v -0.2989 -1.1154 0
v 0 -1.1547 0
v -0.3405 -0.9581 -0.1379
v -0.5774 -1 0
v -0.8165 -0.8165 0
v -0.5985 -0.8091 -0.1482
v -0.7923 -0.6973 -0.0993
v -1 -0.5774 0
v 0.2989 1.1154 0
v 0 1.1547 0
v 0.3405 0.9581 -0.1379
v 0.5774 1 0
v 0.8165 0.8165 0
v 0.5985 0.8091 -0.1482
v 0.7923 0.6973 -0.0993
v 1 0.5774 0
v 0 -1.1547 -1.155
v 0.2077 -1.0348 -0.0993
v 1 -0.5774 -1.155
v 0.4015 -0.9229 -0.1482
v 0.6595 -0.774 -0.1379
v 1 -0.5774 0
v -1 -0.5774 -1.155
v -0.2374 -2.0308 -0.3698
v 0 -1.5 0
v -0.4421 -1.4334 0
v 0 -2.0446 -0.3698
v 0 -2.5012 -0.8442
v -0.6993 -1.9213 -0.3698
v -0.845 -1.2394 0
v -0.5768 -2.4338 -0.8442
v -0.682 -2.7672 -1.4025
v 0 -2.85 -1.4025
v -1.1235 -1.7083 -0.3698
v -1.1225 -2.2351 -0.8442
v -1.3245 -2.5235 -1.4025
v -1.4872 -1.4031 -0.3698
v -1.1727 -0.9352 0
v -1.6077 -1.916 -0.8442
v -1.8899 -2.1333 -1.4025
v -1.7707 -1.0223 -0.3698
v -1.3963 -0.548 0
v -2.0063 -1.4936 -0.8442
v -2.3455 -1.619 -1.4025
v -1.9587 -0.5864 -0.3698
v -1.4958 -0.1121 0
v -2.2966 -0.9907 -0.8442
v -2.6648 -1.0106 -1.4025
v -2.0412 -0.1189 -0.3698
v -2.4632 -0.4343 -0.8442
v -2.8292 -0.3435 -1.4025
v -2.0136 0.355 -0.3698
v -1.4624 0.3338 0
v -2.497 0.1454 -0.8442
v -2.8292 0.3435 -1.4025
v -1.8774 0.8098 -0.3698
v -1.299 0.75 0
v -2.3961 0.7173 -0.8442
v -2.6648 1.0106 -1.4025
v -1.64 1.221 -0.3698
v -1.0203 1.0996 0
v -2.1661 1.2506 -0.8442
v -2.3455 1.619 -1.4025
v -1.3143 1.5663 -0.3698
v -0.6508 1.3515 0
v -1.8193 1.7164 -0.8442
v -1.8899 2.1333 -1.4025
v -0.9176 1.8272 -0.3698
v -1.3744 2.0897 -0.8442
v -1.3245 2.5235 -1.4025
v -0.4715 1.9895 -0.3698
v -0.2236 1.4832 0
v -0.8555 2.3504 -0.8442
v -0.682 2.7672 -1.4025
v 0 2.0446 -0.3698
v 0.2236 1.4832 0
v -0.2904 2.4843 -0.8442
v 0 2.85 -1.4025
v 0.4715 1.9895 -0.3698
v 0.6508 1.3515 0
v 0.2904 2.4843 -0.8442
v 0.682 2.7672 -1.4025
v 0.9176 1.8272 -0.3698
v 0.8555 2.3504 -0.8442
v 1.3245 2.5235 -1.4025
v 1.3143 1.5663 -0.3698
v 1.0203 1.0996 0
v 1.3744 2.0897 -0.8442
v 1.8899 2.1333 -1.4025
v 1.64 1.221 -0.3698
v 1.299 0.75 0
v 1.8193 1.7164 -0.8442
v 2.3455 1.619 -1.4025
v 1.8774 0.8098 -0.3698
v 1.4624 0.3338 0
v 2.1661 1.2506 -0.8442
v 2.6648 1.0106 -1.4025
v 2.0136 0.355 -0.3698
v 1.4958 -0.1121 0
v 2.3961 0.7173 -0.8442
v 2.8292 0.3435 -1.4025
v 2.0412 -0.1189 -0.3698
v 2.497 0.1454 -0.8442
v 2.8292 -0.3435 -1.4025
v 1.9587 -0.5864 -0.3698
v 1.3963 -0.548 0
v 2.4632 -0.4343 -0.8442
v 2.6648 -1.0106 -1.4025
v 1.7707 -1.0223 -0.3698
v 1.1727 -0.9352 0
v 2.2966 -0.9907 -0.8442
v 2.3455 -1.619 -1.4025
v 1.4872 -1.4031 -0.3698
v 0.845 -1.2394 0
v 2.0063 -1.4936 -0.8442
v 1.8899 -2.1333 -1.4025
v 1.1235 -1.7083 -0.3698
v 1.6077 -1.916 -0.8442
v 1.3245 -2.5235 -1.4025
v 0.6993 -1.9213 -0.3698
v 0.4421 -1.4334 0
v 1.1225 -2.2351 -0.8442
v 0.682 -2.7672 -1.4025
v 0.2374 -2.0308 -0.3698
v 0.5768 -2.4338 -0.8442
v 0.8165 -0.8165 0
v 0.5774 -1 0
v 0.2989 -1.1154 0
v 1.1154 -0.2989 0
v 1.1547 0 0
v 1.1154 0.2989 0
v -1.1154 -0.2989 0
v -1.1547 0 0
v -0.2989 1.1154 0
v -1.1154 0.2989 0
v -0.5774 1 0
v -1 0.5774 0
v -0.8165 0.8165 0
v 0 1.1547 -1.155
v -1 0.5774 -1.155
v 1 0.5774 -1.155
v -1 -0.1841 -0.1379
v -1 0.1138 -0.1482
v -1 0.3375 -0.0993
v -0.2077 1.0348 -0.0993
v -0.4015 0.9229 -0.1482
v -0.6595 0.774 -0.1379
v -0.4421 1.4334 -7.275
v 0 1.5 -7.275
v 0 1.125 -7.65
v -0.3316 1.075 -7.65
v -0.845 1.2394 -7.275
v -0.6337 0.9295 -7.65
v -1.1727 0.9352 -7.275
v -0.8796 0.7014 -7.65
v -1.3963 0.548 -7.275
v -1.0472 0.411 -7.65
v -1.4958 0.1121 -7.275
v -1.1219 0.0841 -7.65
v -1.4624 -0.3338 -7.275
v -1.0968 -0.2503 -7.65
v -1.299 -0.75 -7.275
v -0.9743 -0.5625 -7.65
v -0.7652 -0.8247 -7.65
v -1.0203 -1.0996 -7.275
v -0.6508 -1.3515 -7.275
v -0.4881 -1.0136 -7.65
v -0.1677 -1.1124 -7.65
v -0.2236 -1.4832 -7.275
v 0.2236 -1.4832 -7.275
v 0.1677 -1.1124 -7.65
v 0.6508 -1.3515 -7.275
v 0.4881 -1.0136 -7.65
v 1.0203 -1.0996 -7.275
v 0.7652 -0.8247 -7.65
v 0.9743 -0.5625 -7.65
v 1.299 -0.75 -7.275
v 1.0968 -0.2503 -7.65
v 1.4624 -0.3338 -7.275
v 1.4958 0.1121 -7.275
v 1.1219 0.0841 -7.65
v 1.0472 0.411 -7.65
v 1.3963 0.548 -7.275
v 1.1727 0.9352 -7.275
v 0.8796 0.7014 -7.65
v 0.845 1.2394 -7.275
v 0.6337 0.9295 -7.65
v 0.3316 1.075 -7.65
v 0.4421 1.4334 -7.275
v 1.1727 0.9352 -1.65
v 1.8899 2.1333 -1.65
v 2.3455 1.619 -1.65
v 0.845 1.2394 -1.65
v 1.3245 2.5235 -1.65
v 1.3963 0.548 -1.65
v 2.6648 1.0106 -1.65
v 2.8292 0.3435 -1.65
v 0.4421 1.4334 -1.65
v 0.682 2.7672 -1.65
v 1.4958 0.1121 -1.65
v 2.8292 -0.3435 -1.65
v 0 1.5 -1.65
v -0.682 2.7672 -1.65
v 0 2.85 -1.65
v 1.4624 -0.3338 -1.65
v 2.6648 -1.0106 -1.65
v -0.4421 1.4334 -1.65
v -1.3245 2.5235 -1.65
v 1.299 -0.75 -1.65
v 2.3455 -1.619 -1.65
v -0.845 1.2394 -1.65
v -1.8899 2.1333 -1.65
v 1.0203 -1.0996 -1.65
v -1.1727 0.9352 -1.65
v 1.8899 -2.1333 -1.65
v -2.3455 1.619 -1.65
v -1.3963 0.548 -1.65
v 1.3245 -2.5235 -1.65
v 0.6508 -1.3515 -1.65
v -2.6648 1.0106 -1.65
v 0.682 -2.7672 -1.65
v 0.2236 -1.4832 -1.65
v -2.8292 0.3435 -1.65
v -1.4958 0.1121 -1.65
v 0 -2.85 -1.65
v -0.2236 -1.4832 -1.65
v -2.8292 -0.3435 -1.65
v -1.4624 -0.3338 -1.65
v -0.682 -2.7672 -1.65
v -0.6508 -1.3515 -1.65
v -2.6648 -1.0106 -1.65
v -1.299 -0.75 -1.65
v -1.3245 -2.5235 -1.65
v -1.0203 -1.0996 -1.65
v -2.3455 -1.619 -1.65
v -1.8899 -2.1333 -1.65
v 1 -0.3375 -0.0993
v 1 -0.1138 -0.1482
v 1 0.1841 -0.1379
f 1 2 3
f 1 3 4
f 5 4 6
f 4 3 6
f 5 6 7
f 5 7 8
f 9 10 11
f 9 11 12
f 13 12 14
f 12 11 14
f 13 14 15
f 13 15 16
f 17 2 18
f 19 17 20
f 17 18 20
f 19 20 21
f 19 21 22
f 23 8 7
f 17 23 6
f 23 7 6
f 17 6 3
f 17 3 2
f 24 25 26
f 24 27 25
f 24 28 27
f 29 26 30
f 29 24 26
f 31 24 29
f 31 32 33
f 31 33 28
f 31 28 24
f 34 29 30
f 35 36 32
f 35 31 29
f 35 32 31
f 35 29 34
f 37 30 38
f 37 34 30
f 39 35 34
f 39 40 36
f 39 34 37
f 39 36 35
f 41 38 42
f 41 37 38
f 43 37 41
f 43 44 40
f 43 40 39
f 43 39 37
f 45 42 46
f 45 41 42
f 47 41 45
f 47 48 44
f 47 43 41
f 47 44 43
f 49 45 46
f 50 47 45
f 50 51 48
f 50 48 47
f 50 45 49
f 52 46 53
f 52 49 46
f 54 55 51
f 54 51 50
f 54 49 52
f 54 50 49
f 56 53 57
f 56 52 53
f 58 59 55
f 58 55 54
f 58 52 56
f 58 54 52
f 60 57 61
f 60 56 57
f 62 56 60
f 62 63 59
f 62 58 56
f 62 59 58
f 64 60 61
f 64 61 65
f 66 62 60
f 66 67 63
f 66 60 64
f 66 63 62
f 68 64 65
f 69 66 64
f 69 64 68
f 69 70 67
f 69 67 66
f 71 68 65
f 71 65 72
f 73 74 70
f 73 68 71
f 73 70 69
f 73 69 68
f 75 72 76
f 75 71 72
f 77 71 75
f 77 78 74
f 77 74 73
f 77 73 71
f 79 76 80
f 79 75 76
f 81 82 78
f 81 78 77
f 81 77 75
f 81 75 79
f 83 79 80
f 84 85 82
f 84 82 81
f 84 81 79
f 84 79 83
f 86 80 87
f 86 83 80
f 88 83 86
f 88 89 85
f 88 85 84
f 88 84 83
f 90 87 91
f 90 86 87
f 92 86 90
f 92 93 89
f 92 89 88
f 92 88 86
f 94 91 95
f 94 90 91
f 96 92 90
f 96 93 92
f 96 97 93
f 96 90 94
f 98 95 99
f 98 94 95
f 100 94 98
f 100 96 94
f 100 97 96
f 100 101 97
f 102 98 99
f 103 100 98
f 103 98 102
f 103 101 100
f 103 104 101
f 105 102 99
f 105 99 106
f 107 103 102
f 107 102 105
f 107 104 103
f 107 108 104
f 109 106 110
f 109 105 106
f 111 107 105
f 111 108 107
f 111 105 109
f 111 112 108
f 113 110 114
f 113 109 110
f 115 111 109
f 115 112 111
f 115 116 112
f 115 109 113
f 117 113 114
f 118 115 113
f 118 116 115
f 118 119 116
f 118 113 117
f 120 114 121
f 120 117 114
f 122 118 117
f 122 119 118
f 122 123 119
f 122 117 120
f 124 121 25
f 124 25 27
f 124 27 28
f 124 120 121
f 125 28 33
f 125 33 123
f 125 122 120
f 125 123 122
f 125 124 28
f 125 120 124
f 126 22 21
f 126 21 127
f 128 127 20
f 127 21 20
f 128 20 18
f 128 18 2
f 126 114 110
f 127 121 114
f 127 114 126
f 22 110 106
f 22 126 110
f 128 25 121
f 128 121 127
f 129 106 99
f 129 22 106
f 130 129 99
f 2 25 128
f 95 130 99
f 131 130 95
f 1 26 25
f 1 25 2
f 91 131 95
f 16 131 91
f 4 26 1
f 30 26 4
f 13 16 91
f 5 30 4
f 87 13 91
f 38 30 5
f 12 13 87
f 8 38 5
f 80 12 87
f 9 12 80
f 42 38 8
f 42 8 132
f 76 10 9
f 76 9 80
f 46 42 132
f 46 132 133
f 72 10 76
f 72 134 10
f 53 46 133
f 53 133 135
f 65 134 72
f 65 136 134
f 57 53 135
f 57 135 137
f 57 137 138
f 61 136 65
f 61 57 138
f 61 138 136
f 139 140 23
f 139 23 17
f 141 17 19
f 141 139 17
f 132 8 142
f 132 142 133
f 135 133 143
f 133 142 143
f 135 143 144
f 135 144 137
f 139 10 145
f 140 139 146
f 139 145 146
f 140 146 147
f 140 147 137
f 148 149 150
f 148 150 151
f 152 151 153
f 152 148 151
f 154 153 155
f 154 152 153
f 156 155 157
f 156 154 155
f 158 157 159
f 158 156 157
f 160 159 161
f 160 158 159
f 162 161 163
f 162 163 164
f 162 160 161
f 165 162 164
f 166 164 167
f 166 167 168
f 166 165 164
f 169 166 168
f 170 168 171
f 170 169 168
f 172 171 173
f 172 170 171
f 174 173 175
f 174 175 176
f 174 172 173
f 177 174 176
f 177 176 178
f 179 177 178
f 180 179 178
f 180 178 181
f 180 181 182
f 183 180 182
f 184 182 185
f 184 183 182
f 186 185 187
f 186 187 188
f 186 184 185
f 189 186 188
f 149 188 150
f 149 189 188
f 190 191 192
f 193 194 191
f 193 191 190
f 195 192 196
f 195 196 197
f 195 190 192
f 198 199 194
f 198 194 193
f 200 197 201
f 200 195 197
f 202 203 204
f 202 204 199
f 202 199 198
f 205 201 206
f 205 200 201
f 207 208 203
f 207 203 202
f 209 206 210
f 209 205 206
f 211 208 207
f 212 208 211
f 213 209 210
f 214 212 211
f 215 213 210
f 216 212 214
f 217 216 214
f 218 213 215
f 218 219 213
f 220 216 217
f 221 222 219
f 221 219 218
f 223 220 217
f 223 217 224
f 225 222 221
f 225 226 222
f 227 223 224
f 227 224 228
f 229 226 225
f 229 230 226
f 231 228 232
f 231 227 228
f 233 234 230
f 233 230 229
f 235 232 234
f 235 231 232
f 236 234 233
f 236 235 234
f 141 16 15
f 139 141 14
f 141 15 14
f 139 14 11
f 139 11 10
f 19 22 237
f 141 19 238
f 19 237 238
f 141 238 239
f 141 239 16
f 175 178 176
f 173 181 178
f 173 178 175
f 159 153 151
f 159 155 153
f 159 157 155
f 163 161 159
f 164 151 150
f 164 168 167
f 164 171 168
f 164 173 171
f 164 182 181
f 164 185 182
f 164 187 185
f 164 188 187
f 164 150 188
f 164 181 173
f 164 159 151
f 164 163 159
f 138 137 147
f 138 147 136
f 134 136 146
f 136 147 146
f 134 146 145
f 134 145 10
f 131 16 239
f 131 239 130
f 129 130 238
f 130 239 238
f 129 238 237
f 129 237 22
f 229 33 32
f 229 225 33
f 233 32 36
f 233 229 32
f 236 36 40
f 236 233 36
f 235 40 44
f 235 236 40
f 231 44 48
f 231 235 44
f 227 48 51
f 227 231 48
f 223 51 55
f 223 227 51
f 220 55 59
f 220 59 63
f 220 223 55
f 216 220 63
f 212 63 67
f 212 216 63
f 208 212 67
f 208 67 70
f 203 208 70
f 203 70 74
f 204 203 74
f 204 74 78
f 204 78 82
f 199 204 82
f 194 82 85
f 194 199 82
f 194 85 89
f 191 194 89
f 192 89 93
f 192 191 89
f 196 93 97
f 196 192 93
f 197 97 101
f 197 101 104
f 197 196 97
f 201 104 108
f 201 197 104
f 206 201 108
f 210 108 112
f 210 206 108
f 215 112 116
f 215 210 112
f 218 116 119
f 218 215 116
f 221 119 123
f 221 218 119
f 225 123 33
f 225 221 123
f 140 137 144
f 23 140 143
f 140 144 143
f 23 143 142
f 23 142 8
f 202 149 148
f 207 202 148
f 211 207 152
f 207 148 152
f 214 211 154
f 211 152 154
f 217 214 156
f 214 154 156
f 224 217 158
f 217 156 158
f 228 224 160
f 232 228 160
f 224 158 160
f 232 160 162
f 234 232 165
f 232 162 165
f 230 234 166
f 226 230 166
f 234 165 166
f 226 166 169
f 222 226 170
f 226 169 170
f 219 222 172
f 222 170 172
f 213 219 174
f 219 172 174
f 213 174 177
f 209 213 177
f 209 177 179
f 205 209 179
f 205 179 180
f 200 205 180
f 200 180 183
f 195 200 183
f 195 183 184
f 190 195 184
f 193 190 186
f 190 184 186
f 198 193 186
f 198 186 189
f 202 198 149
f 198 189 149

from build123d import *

# Parameters (mm, degrees)
SKETCH1_W          = 6
SKETCH1_H          = 1.5
CHAMFER1_SIZE      = 0.375
CUT_EXTRUDE2_DEPTH = 1.155


with BuildPart() as part:
    # Sketch1 → Revolve1 (revolve)
    with BuildSketch(Plane(origin=(0, 0, 0), x_dir=(0, 0, -1), z_dir=(1, 0, 0))):
        with Locations((4.65, 0.75)):
            Rectangle(SKETCH1_W, SKETCH1_H)
    revolve(axis=Axis((0, 0, -7.65), (0, 0, 1)))

    # Chamfer1
    chamfer1_edges = [part.edges().sort_by_distance(p)[0] for p in [
        (0, -1.5, -7.65),
    ]]
    chamfer(chamfer1_edges, length=CHAMFER1_SIZE)

    # Sketch7 → Revolve2 (revolve)
    with BuildSketch(Plane(origin=(0, 0, 0), x_dir=(0, 0, -1), z_dir=(1, 0, 0))):
        with BuildLine():
            Line((1.4025, 2.85), (1.65, 2.85))
            Line((1.65, 2.85), (1.65, 0))
            Line((1.65, 0), (0, 0))
            Line((0, 0), (0, 1.5))
            ThreePointArc((0, 1.5), (0.59512511, 2.285251969), (1.4025, 2.85))
        make_face()
    revolve(axis=Axis((0, 0, 0), (0, 0, -1)))

    # Sketch5 → Cut-Extrude2 (cut)
    with BuildSketch(Plane.XY):
        Polygon((1, -0.577350269), (1, 0.577350269), (0, 1.154700538), (-1, 0.577350269), (-1, -0.577350269), (0, -1.154700538), align=None)
    extrude(amount=-CUT_EXTRUDE2_DEPTH, mode=Mode.SUBTRACT)

    # Cut-Extrude3 cone 1 section (through the dimple's axis) → Cut-Extrude3 (revolve, cut)
    with BuildSketch(Plane(origin=(0, 0, 0), x_dir=(0, -1, 0), z_dir=(1, 0, 0))):
        Polygon((0, 0), (1.154700538, 0), (0, 1.154700538), align=None)
    revolve(axis=Axis((0, 0, 0), (0, 0, -1)), mode=Mode.SUBTRACT)


solid = part.part
